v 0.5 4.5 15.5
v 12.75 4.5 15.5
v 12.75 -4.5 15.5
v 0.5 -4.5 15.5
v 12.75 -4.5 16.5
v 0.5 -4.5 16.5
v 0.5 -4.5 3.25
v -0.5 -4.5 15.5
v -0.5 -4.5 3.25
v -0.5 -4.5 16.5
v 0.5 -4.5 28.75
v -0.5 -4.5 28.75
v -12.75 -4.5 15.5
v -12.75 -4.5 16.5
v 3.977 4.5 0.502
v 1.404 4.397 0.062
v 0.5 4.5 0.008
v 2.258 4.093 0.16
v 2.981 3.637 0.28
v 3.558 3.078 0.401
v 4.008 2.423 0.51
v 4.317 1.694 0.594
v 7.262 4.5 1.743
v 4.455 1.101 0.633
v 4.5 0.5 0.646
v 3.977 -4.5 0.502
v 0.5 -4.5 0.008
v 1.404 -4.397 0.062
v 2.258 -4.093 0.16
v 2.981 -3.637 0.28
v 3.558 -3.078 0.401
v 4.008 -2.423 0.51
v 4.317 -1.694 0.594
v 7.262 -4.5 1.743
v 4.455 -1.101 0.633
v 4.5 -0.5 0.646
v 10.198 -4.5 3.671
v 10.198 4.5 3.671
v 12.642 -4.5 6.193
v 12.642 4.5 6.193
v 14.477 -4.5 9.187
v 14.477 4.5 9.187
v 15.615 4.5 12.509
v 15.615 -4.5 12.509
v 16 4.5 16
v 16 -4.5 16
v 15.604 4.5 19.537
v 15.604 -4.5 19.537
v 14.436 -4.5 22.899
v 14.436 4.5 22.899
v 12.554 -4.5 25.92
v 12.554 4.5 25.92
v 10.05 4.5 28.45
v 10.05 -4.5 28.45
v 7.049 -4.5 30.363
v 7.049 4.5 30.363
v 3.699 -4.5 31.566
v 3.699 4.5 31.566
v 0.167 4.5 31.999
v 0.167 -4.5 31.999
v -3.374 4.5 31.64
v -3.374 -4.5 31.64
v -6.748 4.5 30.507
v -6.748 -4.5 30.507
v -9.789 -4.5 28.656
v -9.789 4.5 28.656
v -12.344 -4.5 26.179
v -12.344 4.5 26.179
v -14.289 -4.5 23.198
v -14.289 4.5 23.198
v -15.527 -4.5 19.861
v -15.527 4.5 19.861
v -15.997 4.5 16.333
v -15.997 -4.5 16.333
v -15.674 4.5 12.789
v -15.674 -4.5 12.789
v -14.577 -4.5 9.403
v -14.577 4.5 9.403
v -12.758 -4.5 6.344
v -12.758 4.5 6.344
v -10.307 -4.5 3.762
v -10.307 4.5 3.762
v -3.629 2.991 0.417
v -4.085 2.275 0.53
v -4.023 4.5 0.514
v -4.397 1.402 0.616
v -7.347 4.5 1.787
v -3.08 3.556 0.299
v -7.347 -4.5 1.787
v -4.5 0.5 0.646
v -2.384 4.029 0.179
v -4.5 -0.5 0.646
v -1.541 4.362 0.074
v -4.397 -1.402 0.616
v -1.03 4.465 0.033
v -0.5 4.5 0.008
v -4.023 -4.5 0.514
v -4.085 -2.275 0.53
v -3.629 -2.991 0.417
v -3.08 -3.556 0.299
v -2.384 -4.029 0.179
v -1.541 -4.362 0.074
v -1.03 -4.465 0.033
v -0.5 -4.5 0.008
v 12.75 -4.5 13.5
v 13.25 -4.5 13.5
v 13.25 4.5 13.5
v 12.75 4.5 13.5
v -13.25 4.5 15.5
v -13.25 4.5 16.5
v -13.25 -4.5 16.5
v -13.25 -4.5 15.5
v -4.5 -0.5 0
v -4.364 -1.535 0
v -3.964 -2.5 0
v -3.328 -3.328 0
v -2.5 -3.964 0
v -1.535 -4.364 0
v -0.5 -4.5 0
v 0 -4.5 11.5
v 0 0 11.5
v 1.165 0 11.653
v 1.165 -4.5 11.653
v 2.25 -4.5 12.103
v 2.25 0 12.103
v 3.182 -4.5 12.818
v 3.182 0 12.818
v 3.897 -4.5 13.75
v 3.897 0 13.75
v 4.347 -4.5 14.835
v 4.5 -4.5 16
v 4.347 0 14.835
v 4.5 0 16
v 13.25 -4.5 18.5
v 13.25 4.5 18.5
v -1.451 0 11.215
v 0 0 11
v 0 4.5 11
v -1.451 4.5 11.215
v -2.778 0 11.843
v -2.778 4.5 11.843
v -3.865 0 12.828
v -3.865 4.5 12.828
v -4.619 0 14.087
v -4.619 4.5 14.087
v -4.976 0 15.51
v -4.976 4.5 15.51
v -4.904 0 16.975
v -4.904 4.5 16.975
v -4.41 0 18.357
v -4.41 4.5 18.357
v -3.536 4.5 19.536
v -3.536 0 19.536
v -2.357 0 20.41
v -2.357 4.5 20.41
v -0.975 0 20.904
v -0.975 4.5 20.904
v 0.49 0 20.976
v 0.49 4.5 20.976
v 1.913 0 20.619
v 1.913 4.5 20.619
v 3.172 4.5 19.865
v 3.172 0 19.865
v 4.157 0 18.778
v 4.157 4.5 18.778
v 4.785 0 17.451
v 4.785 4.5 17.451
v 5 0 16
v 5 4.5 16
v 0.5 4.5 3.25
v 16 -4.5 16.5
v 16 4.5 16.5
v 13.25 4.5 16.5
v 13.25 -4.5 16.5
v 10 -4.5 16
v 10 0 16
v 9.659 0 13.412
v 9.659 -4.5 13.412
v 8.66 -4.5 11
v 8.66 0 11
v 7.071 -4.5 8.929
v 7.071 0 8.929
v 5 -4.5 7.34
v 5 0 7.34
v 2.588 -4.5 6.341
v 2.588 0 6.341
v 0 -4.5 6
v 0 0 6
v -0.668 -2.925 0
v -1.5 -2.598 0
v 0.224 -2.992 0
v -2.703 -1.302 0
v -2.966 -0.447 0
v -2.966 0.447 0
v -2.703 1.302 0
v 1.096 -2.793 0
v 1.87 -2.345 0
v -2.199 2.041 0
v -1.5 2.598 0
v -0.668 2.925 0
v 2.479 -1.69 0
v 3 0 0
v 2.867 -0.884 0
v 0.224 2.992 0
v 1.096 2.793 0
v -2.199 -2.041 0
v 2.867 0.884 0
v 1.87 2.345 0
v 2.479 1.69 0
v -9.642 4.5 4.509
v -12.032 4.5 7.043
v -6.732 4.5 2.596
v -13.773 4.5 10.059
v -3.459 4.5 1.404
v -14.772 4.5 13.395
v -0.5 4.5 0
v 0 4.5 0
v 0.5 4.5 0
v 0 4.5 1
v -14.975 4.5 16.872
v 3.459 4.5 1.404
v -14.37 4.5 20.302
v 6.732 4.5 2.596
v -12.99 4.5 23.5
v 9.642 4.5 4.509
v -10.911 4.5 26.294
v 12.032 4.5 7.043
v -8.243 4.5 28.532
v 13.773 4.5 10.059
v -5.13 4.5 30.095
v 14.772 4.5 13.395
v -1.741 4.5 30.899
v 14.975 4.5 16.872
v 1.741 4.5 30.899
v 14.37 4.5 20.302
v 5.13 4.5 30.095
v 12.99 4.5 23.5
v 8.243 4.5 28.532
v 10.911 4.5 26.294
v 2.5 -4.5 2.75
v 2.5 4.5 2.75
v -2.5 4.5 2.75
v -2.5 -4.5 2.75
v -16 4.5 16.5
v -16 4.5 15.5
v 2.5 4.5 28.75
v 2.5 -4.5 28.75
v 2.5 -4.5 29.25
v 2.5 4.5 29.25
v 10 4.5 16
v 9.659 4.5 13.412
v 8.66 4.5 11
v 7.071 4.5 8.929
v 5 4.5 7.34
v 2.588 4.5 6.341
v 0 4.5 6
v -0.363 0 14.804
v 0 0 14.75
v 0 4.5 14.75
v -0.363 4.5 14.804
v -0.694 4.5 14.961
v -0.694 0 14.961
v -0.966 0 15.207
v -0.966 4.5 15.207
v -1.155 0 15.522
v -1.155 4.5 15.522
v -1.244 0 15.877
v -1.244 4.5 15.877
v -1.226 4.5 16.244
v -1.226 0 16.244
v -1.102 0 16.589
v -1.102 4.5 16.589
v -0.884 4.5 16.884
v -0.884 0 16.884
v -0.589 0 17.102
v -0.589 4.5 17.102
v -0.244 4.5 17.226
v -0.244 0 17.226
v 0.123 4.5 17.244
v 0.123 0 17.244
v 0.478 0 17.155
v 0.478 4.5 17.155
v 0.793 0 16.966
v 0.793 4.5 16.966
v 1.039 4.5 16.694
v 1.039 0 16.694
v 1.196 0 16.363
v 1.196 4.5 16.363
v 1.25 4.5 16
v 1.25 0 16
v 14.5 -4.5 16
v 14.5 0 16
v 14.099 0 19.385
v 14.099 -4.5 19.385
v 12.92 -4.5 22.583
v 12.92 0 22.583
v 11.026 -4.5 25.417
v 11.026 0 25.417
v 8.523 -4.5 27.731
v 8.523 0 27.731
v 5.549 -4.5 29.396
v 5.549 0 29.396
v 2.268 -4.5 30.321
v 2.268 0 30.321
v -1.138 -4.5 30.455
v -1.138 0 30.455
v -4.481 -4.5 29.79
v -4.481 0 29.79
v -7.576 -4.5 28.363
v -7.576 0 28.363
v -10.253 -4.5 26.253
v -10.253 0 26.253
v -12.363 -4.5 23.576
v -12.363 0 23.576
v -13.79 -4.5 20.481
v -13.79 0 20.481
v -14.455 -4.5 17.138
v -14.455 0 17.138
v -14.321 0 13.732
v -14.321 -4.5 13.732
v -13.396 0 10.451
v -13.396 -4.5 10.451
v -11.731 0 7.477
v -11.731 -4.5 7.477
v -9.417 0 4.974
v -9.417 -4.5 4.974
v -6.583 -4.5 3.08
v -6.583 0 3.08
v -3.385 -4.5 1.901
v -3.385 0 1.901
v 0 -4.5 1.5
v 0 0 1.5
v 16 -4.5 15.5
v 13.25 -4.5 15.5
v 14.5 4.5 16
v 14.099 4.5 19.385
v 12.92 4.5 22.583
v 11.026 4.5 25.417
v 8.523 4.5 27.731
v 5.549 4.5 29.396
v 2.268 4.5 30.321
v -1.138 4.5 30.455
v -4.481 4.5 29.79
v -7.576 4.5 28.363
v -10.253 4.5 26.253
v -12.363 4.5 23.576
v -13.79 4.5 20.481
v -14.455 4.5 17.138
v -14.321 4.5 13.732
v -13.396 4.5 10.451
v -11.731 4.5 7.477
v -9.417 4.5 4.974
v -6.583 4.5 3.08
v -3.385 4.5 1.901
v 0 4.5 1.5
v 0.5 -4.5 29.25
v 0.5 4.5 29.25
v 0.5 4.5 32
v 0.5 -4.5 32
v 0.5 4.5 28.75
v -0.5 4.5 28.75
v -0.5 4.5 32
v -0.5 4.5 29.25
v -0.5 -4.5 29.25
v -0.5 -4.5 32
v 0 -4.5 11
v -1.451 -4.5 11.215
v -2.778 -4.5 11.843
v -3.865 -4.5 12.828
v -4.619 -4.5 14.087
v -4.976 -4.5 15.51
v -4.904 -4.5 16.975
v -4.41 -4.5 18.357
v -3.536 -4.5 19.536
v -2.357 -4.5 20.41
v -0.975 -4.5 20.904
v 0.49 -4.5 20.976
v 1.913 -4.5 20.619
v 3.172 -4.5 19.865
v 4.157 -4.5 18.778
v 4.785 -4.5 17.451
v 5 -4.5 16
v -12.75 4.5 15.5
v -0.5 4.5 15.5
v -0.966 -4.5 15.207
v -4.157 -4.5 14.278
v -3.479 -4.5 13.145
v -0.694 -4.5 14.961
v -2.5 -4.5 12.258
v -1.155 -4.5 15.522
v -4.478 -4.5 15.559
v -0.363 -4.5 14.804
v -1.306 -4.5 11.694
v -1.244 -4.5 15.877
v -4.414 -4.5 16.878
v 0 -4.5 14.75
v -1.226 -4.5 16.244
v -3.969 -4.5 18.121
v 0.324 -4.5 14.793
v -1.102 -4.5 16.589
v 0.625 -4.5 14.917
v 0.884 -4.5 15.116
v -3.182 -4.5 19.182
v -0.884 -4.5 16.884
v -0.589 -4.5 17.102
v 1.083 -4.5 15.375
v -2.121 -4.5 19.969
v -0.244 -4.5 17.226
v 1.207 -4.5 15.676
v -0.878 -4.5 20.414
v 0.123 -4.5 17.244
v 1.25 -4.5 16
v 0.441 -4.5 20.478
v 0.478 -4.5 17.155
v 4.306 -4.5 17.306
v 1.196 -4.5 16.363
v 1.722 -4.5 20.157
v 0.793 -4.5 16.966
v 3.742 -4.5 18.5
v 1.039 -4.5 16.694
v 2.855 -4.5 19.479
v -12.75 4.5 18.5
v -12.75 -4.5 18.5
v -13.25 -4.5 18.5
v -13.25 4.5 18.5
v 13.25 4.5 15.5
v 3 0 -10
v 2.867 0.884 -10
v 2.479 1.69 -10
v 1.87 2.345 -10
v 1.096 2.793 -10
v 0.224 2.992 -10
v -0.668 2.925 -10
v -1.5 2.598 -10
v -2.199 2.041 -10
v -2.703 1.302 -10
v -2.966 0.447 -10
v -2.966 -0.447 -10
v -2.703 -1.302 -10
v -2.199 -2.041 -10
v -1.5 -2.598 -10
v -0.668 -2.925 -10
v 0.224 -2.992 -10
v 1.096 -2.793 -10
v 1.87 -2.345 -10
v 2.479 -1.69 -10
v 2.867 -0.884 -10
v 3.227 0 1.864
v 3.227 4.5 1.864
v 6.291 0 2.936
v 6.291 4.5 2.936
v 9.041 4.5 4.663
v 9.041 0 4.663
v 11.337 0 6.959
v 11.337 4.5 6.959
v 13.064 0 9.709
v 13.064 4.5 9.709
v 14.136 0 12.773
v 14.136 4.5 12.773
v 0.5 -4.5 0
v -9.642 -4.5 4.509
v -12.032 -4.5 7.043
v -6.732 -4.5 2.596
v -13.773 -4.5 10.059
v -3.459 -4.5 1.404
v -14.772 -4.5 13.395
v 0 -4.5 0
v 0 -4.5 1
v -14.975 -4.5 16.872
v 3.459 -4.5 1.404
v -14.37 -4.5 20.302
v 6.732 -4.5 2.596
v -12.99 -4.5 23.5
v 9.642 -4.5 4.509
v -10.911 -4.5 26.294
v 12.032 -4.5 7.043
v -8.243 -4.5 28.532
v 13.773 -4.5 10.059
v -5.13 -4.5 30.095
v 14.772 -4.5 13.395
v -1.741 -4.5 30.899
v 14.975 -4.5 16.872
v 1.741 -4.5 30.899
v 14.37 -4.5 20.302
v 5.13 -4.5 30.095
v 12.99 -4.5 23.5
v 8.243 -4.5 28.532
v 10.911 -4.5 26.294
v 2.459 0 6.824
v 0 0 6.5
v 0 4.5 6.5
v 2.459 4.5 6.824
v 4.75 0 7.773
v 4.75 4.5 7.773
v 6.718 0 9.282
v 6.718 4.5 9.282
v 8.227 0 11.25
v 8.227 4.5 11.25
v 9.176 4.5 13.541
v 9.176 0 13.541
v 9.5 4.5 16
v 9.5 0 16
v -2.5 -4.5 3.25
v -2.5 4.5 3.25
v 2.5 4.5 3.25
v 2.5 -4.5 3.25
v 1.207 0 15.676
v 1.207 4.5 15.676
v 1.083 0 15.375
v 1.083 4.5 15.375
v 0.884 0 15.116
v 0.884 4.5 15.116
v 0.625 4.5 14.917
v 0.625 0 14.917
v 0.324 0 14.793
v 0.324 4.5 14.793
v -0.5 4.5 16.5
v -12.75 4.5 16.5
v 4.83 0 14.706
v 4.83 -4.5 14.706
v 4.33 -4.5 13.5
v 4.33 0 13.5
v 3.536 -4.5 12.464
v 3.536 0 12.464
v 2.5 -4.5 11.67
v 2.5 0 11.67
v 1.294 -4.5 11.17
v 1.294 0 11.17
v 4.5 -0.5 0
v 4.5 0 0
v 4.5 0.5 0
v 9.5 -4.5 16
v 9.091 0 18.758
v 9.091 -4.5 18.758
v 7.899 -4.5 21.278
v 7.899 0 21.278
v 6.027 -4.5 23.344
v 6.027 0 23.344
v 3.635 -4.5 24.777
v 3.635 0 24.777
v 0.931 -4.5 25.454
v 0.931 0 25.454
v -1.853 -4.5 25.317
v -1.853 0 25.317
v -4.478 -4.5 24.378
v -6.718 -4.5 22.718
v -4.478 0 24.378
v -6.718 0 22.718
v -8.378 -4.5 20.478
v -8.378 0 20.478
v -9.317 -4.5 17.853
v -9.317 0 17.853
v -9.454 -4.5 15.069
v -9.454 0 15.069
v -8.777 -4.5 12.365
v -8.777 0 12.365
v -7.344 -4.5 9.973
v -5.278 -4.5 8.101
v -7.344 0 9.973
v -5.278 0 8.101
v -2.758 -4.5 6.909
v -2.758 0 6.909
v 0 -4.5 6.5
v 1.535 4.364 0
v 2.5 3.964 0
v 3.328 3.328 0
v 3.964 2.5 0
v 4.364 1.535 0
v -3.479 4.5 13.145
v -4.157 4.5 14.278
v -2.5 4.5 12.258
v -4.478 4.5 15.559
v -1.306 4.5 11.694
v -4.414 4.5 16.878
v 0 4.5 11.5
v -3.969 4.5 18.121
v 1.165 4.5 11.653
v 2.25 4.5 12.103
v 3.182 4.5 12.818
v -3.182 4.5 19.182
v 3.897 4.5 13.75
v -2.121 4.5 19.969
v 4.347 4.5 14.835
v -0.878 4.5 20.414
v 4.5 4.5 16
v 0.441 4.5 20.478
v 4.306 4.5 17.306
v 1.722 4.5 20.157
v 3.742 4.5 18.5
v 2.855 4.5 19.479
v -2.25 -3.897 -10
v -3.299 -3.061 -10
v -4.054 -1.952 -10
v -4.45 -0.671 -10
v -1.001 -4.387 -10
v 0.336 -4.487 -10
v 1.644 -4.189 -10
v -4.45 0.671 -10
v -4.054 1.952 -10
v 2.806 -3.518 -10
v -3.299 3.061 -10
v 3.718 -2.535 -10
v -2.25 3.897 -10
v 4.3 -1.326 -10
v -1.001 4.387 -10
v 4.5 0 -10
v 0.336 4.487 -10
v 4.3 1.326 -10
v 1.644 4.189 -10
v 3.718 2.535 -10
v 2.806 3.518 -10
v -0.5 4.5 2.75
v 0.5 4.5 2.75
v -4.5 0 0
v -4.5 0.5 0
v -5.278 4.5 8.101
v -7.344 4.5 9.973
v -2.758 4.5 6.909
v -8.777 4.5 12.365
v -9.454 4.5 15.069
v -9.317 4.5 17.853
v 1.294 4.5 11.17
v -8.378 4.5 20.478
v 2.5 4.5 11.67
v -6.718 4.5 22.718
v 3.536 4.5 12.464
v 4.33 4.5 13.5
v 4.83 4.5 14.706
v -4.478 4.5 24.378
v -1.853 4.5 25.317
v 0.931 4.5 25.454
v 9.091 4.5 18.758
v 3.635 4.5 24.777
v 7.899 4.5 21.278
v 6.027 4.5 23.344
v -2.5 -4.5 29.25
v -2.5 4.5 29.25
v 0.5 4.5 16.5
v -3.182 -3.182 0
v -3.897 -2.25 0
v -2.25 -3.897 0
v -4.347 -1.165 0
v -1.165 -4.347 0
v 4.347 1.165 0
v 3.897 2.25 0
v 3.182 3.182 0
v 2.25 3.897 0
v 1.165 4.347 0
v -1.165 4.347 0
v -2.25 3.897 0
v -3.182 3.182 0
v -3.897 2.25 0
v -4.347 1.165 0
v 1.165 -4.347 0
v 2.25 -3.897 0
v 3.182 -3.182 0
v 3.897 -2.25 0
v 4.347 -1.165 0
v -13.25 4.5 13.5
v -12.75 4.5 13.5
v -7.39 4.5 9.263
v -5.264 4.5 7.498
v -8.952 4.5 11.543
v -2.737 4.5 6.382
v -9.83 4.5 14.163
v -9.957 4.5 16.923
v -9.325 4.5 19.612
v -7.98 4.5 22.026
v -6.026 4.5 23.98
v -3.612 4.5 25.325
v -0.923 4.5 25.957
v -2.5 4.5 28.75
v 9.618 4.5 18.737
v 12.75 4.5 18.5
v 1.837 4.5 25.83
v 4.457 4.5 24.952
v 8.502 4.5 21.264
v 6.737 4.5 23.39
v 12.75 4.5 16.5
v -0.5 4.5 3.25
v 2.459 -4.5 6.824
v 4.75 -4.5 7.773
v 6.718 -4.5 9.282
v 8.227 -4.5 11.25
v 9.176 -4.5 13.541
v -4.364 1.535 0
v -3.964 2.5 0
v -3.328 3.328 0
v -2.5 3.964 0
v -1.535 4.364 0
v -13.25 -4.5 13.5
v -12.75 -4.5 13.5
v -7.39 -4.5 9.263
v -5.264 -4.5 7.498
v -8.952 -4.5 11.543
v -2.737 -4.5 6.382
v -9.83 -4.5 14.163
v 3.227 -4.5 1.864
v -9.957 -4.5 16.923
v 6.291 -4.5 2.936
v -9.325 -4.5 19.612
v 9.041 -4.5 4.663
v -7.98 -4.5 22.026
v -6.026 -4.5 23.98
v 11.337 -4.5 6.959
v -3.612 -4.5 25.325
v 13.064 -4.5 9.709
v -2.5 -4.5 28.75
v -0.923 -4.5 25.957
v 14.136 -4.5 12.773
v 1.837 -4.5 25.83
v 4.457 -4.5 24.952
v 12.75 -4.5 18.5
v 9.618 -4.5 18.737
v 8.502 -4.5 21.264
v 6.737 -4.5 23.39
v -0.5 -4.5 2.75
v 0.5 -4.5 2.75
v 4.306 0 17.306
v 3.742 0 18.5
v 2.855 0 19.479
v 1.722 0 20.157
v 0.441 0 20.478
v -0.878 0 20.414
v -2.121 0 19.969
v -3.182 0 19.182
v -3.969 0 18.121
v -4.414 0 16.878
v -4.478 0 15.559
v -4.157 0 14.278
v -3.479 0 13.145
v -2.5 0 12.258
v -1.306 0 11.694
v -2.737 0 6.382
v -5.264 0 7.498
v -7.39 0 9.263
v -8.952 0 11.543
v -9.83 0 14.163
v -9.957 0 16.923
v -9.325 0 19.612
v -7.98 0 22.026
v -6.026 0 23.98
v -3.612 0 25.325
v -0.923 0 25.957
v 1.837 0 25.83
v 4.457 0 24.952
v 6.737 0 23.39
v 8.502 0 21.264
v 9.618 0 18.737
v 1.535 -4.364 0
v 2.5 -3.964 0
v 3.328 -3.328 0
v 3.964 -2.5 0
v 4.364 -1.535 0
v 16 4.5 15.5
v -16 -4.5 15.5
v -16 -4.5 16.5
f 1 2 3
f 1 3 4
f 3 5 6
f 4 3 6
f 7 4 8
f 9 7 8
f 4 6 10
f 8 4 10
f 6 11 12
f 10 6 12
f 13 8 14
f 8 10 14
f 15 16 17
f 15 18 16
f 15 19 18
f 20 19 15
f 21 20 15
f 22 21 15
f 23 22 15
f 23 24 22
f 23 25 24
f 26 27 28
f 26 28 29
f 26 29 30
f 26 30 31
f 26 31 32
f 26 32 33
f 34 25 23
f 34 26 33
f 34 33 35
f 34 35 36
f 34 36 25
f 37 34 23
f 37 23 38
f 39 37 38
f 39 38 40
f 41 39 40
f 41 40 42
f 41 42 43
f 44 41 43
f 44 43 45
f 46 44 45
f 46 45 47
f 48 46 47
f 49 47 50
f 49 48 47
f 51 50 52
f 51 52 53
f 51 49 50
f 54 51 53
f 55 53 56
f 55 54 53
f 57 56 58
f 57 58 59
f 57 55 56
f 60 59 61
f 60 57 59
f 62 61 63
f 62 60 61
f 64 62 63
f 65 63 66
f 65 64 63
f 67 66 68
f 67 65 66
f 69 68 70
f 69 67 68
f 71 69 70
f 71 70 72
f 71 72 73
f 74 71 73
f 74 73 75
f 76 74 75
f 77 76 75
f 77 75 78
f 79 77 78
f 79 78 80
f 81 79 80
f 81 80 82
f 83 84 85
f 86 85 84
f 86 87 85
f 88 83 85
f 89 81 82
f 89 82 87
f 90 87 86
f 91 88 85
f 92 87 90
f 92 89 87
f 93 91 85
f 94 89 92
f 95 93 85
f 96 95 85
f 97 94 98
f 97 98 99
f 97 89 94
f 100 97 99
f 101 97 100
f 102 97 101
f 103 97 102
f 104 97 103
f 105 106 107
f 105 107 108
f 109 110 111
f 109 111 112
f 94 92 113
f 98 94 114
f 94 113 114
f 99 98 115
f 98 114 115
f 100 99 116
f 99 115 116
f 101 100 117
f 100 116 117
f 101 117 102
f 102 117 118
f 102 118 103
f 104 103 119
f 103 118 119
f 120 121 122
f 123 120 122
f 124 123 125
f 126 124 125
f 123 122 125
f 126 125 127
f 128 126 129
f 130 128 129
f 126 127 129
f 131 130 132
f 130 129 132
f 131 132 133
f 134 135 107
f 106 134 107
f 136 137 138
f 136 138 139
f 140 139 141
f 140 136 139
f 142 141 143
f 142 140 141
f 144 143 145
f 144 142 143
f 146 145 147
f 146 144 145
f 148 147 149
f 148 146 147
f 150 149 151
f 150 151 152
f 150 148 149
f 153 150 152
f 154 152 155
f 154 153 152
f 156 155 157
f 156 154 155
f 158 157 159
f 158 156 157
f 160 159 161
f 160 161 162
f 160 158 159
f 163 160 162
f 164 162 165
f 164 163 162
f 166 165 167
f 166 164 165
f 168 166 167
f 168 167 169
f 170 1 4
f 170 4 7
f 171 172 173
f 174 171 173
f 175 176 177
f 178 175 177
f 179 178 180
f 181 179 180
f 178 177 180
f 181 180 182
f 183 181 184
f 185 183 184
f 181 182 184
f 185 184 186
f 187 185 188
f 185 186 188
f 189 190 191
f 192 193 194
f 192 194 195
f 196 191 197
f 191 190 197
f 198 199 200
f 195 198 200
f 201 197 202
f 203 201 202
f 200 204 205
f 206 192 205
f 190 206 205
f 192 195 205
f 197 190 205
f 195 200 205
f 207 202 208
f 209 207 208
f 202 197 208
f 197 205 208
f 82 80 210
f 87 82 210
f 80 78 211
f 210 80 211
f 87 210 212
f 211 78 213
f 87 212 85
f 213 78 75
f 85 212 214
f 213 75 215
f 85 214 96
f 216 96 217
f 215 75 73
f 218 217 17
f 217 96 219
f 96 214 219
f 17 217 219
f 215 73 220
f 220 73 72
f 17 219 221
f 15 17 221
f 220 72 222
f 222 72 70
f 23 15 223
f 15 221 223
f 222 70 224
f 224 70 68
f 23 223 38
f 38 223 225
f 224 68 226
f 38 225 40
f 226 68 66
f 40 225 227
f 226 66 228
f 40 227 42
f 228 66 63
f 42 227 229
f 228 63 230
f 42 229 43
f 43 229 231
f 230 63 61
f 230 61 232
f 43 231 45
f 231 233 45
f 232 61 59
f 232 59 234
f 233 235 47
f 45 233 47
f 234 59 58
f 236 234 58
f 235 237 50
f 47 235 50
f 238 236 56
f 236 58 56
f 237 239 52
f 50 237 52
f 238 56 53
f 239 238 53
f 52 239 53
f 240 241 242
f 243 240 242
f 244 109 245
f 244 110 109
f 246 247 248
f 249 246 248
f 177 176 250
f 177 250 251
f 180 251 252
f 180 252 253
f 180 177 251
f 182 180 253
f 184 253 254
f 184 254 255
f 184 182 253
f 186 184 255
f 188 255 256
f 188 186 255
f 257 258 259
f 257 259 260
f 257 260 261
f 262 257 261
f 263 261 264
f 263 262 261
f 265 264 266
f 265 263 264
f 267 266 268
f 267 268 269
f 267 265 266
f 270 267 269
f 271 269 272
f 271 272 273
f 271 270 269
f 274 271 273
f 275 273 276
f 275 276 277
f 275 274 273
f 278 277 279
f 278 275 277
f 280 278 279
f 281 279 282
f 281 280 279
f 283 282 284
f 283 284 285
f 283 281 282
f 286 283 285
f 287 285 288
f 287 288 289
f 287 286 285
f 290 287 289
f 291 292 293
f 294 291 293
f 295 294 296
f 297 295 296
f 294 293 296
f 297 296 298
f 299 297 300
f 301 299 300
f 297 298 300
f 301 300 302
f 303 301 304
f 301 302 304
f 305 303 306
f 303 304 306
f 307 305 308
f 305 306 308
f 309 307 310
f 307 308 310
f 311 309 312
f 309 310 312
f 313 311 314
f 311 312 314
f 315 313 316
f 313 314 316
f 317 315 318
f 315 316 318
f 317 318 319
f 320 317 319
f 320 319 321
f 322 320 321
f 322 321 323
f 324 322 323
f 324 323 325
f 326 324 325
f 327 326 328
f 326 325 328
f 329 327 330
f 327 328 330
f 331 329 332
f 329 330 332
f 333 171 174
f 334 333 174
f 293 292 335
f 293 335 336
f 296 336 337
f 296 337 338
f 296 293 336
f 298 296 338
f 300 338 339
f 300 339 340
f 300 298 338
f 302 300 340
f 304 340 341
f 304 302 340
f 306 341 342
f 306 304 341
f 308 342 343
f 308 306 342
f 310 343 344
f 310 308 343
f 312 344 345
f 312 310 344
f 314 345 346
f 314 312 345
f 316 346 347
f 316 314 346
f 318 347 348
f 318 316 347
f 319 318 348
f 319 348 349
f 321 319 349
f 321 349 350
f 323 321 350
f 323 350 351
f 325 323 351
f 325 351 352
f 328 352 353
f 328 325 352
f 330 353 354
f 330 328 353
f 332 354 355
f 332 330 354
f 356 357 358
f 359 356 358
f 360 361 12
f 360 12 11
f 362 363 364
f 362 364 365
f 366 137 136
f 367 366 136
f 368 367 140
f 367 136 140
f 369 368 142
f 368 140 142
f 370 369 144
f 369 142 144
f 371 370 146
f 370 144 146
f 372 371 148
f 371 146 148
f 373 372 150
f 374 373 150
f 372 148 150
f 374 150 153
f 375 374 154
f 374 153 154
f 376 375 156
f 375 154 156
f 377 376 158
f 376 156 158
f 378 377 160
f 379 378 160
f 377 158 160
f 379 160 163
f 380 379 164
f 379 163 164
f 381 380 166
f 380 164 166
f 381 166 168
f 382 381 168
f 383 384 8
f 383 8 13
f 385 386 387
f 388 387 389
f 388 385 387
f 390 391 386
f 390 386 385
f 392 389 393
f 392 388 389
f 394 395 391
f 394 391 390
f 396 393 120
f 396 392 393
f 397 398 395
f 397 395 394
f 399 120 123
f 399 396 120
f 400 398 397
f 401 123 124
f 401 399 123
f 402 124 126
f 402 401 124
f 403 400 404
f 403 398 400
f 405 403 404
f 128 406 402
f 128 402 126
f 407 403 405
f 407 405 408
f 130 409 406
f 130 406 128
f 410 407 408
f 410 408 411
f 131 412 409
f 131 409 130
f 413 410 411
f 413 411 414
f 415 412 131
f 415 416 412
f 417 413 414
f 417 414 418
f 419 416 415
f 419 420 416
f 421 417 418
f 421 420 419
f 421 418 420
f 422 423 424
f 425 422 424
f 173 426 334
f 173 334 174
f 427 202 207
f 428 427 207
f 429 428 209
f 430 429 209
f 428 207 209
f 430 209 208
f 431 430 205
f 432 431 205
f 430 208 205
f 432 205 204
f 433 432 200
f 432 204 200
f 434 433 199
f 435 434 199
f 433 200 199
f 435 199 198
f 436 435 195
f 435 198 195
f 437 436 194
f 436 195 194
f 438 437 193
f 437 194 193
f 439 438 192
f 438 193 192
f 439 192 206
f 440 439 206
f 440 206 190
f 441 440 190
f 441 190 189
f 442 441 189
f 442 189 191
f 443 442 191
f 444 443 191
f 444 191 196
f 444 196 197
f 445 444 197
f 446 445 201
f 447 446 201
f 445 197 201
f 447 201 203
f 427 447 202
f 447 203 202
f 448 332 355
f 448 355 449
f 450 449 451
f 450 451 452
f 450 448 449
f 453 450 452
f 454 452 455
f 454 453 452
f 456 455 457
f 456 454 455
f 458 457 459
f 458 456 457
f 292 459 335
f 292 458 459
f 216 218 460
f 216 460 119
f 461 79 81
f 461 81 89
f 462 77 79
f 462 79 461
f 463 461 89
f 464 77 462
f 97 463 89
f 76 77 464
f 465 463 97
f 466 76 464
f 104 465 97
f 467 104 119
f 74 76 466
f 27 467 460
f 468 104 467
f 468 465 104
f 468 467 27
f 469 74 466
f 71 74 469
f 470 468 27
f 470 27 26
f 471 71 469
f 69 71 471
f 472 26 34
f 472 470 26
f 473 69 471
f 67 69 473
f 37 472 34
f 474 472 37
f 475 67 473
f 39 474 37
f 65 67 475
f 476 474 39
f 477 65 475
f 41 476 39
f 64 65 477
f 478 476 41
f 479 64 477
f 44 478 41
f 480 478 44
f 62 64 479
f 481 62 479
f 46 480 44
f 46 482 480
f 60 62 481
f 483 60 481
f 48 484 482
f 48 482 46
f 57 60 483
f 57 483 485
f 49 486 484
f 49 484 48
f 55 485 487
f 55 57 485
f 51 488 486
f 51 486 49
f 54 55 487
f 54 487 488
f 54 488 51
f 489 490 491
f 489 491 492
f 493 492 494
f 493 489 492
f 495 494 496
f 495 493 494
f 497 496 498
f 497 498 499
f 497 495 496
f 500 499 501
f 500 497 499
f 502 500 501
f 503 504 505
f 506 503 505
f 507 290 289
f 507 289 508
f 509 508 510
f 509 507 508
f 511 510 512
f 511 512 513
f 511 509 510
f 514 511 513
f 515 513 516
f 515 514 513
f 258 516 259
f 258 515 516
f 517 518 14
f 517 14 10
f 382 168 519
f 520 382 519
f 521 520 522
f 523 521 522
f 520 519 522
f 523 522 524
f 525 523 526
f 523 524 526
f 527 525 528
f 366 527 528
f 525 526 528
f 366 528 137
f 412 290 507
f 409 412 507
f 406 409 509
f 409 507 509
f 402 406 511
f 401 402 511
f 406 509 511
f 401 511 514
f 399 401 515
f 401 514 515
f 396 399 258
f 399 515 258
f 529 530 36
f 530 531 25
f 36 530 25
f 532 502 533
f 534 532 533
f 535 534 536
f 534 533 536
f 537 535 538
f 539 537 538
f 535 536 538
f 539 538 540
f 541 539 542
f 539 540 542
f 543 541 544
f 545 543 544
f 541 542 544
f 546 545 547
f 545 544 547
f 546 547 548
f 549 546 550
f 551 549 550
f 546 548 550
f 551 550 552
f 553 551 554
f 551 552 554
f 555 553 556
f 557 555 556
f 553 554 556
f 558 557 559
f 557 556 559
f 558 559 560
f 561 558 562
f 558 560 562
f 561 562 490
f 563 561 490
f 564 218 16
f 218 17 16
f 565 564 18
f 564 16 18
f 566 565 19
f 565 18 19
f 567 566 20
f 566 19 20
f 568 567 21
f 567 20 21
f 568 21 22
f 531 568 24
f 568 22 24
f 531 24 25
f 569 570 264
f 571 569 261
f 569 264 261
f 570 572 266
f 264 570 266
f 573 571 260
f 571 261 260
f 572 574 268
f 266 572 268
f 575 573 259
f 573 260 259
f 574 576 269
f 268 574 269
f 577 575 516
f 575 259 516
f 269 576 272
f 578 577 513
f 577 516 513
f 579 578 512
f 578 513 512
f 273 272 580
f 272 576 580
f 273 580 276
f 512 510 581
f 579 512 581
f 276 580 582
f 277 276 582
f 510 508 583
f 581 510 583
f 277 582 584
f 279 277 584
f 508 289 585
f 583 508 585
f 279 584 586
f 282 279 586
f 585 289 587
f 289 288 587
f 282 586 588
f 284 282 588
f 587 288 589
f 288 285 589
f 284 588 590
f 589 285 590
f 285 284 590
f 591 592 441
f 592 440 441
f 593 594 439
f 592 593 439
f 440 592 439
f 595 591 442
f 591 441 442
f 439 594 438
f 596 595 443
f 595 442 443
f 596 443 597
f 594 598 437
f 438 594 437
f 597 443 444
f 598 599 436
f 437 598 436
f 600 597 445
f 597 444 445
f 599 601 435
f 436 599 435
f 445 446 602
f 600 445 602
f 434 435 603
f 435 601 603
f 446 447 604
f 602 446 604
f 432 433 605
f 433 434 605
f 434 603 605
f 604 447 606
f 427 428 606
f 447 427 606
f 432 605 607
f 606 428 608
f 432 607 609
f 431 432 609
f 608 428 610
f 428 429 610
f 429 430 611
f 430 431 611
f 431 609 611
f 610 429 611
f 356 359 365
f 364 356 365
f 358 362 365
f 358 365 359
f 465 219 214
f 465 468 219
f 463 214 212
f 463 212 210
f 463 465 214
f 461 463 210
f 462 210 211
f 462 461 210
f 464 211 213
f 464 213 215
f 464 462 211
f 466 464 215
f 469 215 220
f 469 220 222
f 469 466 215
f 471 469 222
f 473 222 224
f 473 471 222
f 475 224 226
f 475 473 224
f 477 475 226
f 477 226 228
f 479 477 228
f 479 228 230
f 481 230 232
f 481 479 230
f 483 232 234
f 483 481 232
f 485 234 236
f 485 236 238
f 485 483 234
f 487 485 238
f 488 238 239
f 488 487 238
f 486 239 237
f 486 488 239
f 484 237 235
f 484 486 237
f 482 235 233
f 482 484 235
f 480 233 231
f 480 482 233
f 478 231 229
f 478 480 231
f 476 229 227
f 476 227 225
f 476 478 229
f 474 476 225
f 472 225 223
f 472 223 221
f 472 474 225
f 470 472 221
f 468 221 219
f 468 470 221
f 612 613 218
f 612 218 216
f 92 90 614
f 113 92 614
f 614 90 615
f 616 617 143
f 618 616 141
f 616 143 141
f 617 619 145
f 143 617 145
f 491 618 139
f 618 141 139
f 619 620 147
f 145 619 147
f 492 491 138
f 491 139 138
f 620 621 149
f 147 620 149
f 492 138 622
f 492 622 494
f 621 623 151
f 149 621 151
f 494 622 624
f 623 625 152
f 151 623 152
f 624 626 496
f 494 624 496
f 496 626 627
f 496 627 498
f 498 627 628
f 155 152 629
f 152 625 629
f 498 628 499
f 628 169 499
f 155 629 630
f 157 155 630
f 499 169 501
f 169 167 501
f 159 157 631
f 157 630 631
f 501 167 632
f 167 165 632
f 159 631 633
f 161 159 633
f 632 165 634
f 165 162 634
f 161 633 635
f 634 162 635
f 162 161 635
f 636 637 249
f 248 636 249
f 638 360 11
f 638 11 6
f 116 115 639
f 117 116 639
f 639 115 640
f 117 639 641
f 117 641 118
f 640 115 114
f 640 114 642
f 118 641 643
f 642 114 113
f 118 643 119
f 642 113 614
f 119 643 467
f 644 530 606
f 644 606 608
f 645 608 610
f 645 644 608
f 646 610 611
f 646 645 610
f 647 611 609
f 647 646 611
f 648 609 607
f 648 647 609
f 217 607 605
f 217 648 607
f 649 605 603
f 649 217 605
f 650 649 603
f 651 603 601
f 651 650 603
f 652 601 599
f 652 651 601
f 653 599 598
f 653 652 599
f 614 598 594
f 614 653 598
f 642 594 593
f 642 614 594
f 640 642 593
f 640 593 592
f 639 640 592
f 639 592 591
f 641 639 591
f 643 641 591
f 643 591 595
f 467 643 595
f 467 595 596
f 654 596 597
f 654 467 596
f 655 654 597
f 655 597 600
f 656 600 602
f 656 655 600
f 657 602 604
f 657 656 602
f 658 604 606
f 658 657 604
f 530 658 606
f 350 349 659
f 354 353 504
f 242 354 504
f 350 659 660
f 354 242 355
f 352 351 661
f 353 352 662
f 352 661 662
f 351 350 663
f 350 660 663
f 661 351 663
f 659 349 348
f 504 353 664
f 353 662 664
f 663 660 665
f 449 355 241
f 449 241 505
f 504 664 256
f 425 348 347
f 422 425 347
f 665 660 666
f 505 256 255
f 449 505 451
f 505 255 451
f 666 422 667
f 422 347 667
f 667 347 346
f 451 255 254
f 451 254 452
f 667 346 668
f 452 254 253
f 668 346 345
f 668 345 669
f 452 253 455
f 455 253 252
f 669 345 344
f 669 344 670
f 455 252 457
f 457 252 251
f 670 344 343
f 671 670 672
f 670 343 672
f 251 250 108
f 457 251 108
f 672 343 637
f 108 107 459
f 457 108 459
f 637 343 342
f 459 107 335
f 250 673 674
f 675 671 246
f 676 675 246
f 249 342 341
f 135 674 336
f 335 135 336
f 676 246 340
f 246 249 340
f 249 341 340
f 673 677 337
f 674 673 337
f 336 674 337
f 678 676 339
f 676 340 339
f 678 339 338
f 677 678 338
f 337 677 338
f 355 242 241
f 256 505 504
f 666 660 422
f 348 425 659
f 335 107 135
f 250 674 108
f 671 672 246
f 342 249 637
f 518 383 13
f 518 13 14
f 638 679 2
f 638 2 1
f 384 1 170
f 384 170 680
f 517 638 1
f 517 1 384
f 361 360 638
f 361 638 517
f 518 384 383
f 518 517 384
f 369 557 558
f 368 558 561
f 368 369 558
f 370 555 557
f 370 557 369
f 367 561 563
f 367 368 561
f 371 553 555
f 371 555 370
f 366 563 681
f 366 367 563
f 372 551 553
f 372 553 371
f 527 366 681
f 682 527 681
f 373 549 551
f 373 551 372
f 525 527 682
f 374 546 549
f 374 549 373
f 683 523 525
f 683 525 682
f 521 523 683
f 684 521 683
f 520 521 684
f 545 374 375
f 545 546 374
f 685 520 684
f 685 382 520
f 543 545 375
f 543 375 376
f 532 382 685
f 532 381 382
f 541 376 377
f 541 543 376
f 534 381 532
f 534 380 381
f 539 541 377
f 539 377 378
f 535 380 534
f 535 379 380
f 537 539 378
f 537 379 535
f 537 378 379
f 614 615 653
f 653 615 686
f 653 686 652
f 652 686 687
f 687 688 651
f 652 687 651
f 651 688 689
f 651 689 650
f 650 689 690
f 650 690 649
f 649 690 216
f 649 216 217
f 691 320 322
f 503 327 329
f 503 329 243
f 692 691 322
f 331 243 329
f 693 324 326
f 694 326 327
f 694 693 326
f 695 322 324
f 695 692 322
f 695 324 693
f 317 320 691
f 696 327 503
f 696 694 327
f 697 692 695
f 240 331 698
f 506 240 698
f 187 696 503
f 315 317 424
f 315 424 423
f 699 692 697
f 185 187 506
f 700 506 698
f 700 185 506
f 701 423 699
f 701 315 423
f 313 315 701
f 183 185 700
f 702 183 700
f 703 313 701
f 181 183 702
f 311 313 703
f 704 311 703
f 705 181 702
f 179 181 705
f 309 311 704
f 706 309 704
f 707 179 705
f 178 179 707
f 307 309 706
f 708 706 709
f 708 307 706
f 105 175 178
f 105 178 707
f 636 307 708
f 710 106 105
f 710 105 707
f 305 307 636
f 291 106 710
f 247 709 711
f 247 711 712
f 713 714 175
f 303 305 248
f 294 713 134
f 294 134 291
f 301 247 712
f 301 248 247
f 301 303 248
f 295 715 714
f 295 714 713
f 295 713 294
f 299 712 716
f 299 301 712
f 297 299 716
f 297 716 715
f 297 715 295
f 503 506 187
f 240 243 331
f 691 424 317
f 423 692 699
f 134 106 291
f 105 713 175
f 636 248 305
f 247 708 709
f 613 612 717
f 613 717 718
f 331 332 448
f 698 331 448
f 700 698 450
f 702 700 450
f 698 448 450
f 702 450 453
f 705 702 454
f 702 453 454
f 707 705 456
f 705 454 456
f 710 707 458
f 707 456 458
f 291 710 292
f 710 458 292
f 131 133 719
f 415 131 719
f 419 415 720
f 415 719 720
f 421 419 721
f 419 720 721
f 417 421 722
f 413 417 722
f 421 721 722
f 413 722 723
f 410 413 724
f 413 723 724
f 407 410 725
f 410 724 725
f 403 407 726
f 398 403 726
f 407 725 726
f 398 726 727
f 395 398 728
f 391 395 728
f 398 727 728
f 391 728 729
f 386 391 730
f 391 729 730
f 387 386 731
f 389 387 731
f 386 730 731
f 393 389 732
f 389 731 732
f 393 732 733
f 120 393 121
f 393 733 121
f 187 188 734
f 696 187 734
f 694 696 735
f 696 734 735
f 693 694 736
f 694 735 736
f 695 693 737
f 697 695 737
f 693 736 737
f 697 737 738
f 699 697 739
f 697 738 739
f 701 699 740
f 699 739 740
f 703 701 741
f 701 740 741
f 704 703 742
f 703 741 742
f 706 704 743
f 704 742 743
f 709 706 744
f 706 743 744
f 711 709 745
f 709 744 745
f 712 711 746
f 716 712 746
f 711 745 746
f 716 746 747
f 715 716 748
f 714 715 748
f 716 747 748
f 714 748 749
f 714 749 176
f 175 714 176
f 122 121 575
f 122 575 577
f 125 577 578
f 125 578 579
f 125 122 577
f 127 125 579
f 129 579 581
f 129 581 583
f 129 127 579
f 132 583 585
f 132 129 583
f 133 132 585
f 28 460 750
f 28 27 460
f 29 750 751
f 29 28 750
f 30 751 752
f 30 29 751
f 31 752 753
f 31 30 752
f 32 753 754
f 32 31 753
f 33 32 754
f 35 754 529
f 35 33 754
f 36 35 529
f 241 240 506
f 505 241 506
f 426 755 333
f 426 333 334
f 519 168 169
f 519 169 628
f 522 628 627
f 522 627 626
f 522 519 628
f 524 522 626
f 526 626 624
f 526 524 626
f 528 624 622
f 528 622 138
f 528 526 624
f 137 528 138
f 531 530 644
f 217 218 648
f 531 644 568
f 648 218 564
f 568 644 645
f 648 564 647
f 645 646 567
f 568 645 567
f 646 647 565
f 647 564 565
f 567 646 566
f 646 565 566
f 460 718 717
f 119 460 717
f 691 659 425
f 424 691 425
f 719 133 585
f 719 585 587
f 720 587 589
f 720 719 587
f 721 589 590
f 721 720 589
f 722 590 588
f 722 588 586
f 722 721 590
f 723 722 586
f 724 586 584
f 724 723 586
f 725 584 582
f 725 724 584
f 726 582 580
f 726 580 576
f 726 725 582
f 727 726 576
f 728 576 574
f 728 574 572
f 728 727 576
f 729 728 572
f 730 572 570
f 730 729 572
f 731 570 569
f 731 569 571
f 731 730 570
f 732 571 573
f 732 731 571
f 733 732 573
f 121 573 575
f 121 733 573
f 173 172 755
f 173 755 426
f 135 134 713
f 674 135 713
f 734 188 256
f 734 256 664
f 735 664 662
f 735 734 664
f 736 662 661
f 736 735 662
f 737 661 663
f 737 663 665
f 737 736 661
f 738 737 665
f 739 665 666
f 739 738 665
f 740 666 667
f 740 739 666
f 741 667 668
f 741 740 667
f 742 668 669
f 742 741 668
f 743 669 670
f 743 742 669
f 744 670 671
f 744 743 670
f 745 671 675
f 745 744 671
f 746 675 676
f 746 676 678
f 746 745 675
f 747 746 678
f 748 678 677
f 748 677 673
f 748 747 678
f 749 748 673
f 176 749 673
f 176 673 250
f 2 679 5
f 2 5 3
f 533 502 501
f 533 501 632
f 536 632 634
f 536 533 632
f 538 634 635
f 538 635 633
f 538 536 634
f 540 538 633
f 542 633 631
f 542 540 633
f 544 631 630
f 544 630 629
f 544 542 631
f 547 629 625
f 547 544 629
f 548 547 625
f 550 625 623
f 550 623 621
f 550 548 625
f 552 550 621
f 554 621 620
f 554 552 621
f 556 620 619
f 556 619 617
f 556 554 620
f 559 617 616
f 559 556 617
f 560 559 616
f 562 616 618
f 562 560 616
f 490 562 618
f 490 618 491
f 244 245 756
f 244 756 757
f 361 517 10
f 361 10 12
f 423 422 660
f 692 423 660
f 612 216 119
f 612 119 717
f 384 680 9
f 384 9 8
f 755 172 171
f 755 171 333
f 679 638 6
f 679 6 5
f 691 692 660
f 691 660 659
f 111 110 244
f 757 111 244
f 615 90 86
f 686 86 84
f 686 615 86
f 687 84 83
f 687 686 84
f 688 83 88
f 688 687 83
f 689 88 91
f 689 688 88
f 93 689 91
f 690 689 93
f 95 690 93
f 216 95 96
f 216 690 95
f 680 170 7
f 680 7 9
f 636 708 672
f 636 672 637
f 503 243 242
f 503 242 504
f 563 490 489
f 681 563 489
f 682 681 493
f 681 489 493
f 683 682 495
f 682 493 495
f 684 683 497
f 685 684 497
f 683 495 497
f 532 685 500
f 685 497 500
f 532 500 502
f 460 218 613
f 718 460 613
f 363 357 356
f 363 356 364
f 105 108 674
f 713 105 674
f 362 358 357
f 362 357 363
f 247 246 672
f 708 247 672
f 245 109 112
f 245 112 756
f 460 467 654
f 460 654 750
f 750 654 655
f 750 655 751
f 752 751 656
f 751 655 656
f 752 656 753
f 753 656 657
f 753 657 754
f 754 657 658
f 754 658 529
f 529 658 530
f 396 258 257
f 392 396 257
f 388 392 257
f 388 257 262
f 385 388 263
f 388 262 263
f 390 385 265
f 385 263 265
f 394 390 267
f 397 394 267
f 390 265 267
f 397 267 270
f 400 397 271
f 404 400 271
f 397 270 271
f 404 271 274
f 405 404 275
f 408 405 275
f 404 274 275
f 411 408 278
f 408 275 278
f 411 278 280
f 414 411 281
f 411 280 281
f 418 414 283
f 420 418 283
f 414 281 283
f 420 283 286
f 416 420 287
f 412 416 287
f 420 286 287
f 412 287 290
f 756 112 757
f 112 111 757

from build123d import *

# Parameters (mm, degrees)
F0_R     = 4.5
F0_R_2   = 3
F1_DEPTH = 10
F3_DEPTH = 4.5
F4_R     = 4
F5_W     = 0.5
F5_H     = 2.75
F5_W_2   = 1
F5_H_2   = 1
F5_W_3   = 2.75
F5_H_3   = 0.5
F6_DEPTH = 9
F5_H_4   = 2
F5_W_4   = 2
F7_DEPTH = 25


with BuildPart() as f1:
    # F0 (on Top) → F1 (new body)
    with BuildSketch(Plane.XY):
        Circle(F0_R)
        Circle(F0_R_2, mode=Mode.SUBTRACT)
    extrude(amount=-F1_DEPTH)

    # F2 (on Front) → F3 (join, symmetric)
    with BuildSketch(Plane.XZ):
        with BuildLine():
            Line((-4.5, 0), (0, 0))
            ThreePointArc((0, 0), (-2.273055155, 0.1622848787), (-4.5, 0.6458474672))
            Line((-4.5, 0.6458474672), (-4.5, 0))
        make_face()
        with BuildLine():
            ThreePointArc((4.5, 0.6458474672), (2.273055155, 0.1622848787), (0, 0))
            Line((0, 0), (4.5, 0))
            Line((4.5, 0), (4.5, 0.6458474672))
        make_face()
        with BuildLine():
            ThreePointArc((-4.5, 0.6458474672), (-2.273055155, 0.1622848787), (0, 0))
            ThreePointArc((0, 0), (2.273055155, 0.1622848787), (4.5, 0.6458474672))
            ThreePointArc((4.5, 0.6458474672), (12.8062484749, 6.4083369534), (16, 16))
            ThreePointArc((16, 16), (-9.5916630466, 28.8062484749), (-4.5, 0.6458474672))
        make_face()
        with BuildLine():
            ThreePointArc((15, 16), (10.6066017178, 5.3933982822), (0, 1))
            ThreePointArc((0, 1), (-10.6066017178, 26.6066017178), (15, 16))
        make_face(mode=Mode.SUBTRACT)
        with BuildLine():
            ThreePointArc((14.5, 16), (-10.2530483272, 26.2530483272), (0, 1.5))
            ThreePointArc((0, 1.5), (10.2530483272, 5.7469516728), (14.5, 16))
        make_face()
        with BuildLine():
            ThreePointArc((10, 16), (7.0710678119, 8.9289321881), (0, 6))
            ThreePointArc((0, 6), (-7.0710678119, 23.0710678119), (10, 16))
        make_face(mode=Mode.SUBTRACT)
        with BuildLine():
            ThreePointArc((9.5, 16), (-6.7175144213, 22.7175144213), (0, 6.5))
            ThreePointArc((0, 6.5), (6.7175144213, 9.2824855787), (9.5, 16))
        make_face()
        with BuildLine():
            ThreePointArc((5, 16), (3.5355339059, 12.4644660941), (0, 11))
            ThreePointArc((0, 11), (-3.5355339059, 19.5355339059), (5, 16))
        make_face(mode=Mode.SUBTRACT)
        with BuildLine():
            ThreePointArc((4.5, 16), (-3.1819805153, 19.1819805153), (0, 11.5))
            ThreePointArc((0, 11.5), (3.1819805153, 12.8180194847), (4.5, 16))
        make_face()
        with BuildLine():
            ThreePointArc((1.25, 16), (0.8838834765, 15.1161165235), (0, 14.75))
            ThreePointArc((0, 14.75), (-0.8838834765, 16.8838834765), (1.25, 16))
        make_face(mode=Mode.SUBTRACT)
    extrude(amount=F3_DEPTH, both=True)

    # F4
    f4_edges = [f1.edges().sort_by_distance(p)[0] for p in [
        (-4.5, -4.5, 0.322924),
        (4.5, -4.5, 0.322924),
        (4.5, 4.5, 0.322924),
        (-4.5, 4.5, 0.322924),
    ]]
    fillet(f4_edges, radius=F4_R)

    # F5 (on face) → F7 (cut)
    with BuildSketch(Plane(origin=(0, 4.5, 0), x_dir=(-1, 0, 0), z_dir=(0, 1, 0))):
        with Locations((-13, 17.5)):
            Rectangle(F5_W, F5_H_4)
        Polygon((-13.25, 15.5), (-12.75, 15.5), (-12.75, 16.5), (-13.25, 16.5), (-13.25, 16), align=None)
        with Locations((-13, 14.5)):
            Rectangle(F5_W, F5_H_4)
        with Locations((-1.5, 3)):
            Rectangle(F5_W_4, F5_H_3)
        Polygon((0, 2.75), (0.5, 2.75), (0.5, 3.25), (-0.5, 3.25), (-0.5, 2.75), align=None)
        with Locations((1.5, 3)):
            Rectangle(F5_W_4, F5_H_3)
        with Locations((13, 14.5)):
            Rectangle(F5_W, F5_H_4)
        Polygon((12.75, 16.5), (12.75, 15.5), (13.25, 15.5), (13.25, 16), (13.25, 16.5), align=None)
        with Locations((13, 17.5)):
            Rectangle(F5_W, F5_H_4)
        with Locations((-1.5, 29)):
            Rectangle(F5_W_4, F5_H_3)
        Polygon((-0.5, 29.25), (-0.5, 28.75), (0.5, 28.75), (0.5, 29.25), (0, 29.25), align=None)
        with Locations((1.5, 29)):
            Rectangle(F5_W_4, F5_H_3)
    extrude(amount=-F7_DEPTH, mode=Mode.SUBTRACT)


with BuildPart() as f6:
    # F5 (on face) → F6 (new body)
    with BuildSketch(Plane(origin=(0, 4.5, 0), x_dir=(-1, 0, 0), z_dir=(0, 1, 0))):
        with BuildLine():
            Line((-0.5, 28.75), (-0.5, 20.472135955))
            ThreePointArc((-0.5, 20.472135955), (0, 20.5), (0.5, 20.472135955))
            Line((0.5, 20.472135955), (0.5, 28.75))
            Line((0.5, 28.75), (-0.5, 28.75))
        make_face()
        with Locations((-0.25, 30.625)):
            Rectangle(F5_W, F5_H)
        with Locations((0.25, 30.625)):
            Rectangle(F5_W, F5_H)
        with BuildLine():
            ThreePointArc((-0.5, 17.1456439237), (0, 17.25), (0.5, 17.1456439237))
            Line((0.5, 17.1456439237), (0.5, 20.472135955))
            ThreePointArc((0.5, 20.472135955), (0, 20.5), (-0.5, 20.472135955))
            Line((-0.5, 20.472135955), (-0.5, 17.1456439237))
        make_face()
        with Locations((0, 16)):
            Rectangle(F5_W_2, F5_H_2)
        with BuildLine():
            Line((-0.5, 16.5), (0.5, 16.5))
            Line((0.5, 16.5), (0.5, 17.1456439237))
            ThreePointArc((0.5, 17.1456439237), (0, 17.25), (-0.5, 17.1456439237))
            Line((-0.5, 17.1456439237), (-0.5, 16.5))
        make_face()
        with BuildLine():
            ThreePointArc((-0.5, 11.527864045), (0, 11.5), (0.5, 11.527864045))
            Line((0.5, 11.527864045), (0.5, 14.8543560763))
            ThreePointArc((0.5, 14.8543560763), (0, 14.75), (-0.5, 14.8543560763))
            Line((-0.5, 14.8543560763), (-0.5, 11.527864045))
        make_face()
        with BuildLine():
            ThreePointArc((-0.5, 14.8543560763), (0, 14.75), (0.5, 14.8543560763))
            Line((0.5, 14.8543560763), (0.5, 15.5))
            Line((0.5, 15.5), (-0.5, 15.5))
            Line((-0.5, 15.5), (-0.5, 14.8543560763))
        make_face()
        with BuildLine():
            Line((-0.5, 3.25), (0.5, 3.25))
            Line((0.5, 3.25), (0.5, 11.527864045))
            ThreePointArc((0.5, 11.527864045), (0, 11.5), (-0.5, 11.527864045))
            Line((-0.5, 11.527864045), (-0.5, 3.25))
        make_face()
        with Locations((-0.25, 1.375)):
            Rectangle(F5_W, F5_H)
        with Locations((0.25, 1.375)):
            Rectangle(F5_W, F5_H)
        with Locations((-14.625, 16.25)):
            Rectangle(F5_W_3, F5_H_3)
        with Locations((-14.625, 15.75)):
            Rectangle(F5_W_3, F5_H_3)
        with BuildLine():
            Line((-12.75, 15.5), (-4.472135955, 15.5))
            ThreePointArc((-4.472135955, 15.5), (-4.5, 16), (-4.472135955, 16.5))
            Line((-4.472135955, 16.5), (-12.75, 16.5))
            Line((-12.75, 16.5), (-12.75, 15.5))
        make_face()
        with BuildLine():
            ThreePointArc((-4.472135955, 16.5), (-4.5, 16), (-4.472135955, 15.5))
            Line((-4.472135955, 15.5), (-1.1456439237, 15.5))
            ThreePointArc((-1.1456439237, 15.5), (-1.25, 16), (-1.1456439237, 16.5))
            Line((-1.1456439237, 16.5), (-4.472135955, 16.5))
        make_face()
        with BuildLine():
            Line((-1.1456439237, 15.5), (-0.5, 15.5))
            Line((-0.5, 15.5), (-0.5, 16.5))
            Line((-0.5, 16.5), (-1.1456439237, 16.5))
            ThreePointArc((-1.1456439237, 16.5), (-1.25, 16), (-1.1456439237, 15.5))
        make_face()
        with BuildLine():
            Line((1.1456439237, 15.5), (4.472135955, 15.5))
            ThreePointArc((4.472135955, 15.5), (4.4930285887, 15.7496120984), (4.5, 16))
            ThreePointArc((4.5, 16), (4.4930285887, 16.2503879016), (4.472135955, 16.5))
            Line((4.472135955, 16.5), (1.1456439237, 16.5))
            ThreePointArc((1.1456439237, 16.5), (1.2236328912, 16.2553870546), (1.25, 16))
            ThreePointArc((1.25, 16), (1.2236328912, 15.7446129454), (1.1456439237, 15.5))
        make_face()
        with BuildLine():
            Line((0.5, 16.5), (0.5, 15.5))
            Line((0.5, 15.5), (1.1456439237, 15.5))
            ThreePointArc((1.1456439237, 15.5), (1.2236328912, 15.7446129454), (1.25, 16))
            ThreePointArc((1.25, 16), (1.2236328912, 16.2553870546), (1.1456439237, 16.5))
            Line((1.1456439237, 16.5), (0.5, 16.5))
        make_face()
        with BuildLine():
            ThreePointArc((4.5, 16), (4.4930285887, 15.7496120984), (4.472135955, 15.5))
            Line((4.472135955, 15.5), (12.75, 15.5))
            Line((12.75, 15.5), (12.75, 16.5))
            Line((12.75, 16.5), (4.472135955, 16.5))
            ThreePointArc((4.472135955, 16.5), (4.4930285887, 16.2503879016), (4.5, 16))
        make_face()
        with Locations((14.625, 15.75)):
            Rectangle(F5_W_3, F5_H_3)
        with Locations((14.625, 16.25)):
            Rectangle(F5_W_3, F5_H_3)
    extrude(amount=-F6_DEPTH)


solid = Compound([f1.part, f6.part])
